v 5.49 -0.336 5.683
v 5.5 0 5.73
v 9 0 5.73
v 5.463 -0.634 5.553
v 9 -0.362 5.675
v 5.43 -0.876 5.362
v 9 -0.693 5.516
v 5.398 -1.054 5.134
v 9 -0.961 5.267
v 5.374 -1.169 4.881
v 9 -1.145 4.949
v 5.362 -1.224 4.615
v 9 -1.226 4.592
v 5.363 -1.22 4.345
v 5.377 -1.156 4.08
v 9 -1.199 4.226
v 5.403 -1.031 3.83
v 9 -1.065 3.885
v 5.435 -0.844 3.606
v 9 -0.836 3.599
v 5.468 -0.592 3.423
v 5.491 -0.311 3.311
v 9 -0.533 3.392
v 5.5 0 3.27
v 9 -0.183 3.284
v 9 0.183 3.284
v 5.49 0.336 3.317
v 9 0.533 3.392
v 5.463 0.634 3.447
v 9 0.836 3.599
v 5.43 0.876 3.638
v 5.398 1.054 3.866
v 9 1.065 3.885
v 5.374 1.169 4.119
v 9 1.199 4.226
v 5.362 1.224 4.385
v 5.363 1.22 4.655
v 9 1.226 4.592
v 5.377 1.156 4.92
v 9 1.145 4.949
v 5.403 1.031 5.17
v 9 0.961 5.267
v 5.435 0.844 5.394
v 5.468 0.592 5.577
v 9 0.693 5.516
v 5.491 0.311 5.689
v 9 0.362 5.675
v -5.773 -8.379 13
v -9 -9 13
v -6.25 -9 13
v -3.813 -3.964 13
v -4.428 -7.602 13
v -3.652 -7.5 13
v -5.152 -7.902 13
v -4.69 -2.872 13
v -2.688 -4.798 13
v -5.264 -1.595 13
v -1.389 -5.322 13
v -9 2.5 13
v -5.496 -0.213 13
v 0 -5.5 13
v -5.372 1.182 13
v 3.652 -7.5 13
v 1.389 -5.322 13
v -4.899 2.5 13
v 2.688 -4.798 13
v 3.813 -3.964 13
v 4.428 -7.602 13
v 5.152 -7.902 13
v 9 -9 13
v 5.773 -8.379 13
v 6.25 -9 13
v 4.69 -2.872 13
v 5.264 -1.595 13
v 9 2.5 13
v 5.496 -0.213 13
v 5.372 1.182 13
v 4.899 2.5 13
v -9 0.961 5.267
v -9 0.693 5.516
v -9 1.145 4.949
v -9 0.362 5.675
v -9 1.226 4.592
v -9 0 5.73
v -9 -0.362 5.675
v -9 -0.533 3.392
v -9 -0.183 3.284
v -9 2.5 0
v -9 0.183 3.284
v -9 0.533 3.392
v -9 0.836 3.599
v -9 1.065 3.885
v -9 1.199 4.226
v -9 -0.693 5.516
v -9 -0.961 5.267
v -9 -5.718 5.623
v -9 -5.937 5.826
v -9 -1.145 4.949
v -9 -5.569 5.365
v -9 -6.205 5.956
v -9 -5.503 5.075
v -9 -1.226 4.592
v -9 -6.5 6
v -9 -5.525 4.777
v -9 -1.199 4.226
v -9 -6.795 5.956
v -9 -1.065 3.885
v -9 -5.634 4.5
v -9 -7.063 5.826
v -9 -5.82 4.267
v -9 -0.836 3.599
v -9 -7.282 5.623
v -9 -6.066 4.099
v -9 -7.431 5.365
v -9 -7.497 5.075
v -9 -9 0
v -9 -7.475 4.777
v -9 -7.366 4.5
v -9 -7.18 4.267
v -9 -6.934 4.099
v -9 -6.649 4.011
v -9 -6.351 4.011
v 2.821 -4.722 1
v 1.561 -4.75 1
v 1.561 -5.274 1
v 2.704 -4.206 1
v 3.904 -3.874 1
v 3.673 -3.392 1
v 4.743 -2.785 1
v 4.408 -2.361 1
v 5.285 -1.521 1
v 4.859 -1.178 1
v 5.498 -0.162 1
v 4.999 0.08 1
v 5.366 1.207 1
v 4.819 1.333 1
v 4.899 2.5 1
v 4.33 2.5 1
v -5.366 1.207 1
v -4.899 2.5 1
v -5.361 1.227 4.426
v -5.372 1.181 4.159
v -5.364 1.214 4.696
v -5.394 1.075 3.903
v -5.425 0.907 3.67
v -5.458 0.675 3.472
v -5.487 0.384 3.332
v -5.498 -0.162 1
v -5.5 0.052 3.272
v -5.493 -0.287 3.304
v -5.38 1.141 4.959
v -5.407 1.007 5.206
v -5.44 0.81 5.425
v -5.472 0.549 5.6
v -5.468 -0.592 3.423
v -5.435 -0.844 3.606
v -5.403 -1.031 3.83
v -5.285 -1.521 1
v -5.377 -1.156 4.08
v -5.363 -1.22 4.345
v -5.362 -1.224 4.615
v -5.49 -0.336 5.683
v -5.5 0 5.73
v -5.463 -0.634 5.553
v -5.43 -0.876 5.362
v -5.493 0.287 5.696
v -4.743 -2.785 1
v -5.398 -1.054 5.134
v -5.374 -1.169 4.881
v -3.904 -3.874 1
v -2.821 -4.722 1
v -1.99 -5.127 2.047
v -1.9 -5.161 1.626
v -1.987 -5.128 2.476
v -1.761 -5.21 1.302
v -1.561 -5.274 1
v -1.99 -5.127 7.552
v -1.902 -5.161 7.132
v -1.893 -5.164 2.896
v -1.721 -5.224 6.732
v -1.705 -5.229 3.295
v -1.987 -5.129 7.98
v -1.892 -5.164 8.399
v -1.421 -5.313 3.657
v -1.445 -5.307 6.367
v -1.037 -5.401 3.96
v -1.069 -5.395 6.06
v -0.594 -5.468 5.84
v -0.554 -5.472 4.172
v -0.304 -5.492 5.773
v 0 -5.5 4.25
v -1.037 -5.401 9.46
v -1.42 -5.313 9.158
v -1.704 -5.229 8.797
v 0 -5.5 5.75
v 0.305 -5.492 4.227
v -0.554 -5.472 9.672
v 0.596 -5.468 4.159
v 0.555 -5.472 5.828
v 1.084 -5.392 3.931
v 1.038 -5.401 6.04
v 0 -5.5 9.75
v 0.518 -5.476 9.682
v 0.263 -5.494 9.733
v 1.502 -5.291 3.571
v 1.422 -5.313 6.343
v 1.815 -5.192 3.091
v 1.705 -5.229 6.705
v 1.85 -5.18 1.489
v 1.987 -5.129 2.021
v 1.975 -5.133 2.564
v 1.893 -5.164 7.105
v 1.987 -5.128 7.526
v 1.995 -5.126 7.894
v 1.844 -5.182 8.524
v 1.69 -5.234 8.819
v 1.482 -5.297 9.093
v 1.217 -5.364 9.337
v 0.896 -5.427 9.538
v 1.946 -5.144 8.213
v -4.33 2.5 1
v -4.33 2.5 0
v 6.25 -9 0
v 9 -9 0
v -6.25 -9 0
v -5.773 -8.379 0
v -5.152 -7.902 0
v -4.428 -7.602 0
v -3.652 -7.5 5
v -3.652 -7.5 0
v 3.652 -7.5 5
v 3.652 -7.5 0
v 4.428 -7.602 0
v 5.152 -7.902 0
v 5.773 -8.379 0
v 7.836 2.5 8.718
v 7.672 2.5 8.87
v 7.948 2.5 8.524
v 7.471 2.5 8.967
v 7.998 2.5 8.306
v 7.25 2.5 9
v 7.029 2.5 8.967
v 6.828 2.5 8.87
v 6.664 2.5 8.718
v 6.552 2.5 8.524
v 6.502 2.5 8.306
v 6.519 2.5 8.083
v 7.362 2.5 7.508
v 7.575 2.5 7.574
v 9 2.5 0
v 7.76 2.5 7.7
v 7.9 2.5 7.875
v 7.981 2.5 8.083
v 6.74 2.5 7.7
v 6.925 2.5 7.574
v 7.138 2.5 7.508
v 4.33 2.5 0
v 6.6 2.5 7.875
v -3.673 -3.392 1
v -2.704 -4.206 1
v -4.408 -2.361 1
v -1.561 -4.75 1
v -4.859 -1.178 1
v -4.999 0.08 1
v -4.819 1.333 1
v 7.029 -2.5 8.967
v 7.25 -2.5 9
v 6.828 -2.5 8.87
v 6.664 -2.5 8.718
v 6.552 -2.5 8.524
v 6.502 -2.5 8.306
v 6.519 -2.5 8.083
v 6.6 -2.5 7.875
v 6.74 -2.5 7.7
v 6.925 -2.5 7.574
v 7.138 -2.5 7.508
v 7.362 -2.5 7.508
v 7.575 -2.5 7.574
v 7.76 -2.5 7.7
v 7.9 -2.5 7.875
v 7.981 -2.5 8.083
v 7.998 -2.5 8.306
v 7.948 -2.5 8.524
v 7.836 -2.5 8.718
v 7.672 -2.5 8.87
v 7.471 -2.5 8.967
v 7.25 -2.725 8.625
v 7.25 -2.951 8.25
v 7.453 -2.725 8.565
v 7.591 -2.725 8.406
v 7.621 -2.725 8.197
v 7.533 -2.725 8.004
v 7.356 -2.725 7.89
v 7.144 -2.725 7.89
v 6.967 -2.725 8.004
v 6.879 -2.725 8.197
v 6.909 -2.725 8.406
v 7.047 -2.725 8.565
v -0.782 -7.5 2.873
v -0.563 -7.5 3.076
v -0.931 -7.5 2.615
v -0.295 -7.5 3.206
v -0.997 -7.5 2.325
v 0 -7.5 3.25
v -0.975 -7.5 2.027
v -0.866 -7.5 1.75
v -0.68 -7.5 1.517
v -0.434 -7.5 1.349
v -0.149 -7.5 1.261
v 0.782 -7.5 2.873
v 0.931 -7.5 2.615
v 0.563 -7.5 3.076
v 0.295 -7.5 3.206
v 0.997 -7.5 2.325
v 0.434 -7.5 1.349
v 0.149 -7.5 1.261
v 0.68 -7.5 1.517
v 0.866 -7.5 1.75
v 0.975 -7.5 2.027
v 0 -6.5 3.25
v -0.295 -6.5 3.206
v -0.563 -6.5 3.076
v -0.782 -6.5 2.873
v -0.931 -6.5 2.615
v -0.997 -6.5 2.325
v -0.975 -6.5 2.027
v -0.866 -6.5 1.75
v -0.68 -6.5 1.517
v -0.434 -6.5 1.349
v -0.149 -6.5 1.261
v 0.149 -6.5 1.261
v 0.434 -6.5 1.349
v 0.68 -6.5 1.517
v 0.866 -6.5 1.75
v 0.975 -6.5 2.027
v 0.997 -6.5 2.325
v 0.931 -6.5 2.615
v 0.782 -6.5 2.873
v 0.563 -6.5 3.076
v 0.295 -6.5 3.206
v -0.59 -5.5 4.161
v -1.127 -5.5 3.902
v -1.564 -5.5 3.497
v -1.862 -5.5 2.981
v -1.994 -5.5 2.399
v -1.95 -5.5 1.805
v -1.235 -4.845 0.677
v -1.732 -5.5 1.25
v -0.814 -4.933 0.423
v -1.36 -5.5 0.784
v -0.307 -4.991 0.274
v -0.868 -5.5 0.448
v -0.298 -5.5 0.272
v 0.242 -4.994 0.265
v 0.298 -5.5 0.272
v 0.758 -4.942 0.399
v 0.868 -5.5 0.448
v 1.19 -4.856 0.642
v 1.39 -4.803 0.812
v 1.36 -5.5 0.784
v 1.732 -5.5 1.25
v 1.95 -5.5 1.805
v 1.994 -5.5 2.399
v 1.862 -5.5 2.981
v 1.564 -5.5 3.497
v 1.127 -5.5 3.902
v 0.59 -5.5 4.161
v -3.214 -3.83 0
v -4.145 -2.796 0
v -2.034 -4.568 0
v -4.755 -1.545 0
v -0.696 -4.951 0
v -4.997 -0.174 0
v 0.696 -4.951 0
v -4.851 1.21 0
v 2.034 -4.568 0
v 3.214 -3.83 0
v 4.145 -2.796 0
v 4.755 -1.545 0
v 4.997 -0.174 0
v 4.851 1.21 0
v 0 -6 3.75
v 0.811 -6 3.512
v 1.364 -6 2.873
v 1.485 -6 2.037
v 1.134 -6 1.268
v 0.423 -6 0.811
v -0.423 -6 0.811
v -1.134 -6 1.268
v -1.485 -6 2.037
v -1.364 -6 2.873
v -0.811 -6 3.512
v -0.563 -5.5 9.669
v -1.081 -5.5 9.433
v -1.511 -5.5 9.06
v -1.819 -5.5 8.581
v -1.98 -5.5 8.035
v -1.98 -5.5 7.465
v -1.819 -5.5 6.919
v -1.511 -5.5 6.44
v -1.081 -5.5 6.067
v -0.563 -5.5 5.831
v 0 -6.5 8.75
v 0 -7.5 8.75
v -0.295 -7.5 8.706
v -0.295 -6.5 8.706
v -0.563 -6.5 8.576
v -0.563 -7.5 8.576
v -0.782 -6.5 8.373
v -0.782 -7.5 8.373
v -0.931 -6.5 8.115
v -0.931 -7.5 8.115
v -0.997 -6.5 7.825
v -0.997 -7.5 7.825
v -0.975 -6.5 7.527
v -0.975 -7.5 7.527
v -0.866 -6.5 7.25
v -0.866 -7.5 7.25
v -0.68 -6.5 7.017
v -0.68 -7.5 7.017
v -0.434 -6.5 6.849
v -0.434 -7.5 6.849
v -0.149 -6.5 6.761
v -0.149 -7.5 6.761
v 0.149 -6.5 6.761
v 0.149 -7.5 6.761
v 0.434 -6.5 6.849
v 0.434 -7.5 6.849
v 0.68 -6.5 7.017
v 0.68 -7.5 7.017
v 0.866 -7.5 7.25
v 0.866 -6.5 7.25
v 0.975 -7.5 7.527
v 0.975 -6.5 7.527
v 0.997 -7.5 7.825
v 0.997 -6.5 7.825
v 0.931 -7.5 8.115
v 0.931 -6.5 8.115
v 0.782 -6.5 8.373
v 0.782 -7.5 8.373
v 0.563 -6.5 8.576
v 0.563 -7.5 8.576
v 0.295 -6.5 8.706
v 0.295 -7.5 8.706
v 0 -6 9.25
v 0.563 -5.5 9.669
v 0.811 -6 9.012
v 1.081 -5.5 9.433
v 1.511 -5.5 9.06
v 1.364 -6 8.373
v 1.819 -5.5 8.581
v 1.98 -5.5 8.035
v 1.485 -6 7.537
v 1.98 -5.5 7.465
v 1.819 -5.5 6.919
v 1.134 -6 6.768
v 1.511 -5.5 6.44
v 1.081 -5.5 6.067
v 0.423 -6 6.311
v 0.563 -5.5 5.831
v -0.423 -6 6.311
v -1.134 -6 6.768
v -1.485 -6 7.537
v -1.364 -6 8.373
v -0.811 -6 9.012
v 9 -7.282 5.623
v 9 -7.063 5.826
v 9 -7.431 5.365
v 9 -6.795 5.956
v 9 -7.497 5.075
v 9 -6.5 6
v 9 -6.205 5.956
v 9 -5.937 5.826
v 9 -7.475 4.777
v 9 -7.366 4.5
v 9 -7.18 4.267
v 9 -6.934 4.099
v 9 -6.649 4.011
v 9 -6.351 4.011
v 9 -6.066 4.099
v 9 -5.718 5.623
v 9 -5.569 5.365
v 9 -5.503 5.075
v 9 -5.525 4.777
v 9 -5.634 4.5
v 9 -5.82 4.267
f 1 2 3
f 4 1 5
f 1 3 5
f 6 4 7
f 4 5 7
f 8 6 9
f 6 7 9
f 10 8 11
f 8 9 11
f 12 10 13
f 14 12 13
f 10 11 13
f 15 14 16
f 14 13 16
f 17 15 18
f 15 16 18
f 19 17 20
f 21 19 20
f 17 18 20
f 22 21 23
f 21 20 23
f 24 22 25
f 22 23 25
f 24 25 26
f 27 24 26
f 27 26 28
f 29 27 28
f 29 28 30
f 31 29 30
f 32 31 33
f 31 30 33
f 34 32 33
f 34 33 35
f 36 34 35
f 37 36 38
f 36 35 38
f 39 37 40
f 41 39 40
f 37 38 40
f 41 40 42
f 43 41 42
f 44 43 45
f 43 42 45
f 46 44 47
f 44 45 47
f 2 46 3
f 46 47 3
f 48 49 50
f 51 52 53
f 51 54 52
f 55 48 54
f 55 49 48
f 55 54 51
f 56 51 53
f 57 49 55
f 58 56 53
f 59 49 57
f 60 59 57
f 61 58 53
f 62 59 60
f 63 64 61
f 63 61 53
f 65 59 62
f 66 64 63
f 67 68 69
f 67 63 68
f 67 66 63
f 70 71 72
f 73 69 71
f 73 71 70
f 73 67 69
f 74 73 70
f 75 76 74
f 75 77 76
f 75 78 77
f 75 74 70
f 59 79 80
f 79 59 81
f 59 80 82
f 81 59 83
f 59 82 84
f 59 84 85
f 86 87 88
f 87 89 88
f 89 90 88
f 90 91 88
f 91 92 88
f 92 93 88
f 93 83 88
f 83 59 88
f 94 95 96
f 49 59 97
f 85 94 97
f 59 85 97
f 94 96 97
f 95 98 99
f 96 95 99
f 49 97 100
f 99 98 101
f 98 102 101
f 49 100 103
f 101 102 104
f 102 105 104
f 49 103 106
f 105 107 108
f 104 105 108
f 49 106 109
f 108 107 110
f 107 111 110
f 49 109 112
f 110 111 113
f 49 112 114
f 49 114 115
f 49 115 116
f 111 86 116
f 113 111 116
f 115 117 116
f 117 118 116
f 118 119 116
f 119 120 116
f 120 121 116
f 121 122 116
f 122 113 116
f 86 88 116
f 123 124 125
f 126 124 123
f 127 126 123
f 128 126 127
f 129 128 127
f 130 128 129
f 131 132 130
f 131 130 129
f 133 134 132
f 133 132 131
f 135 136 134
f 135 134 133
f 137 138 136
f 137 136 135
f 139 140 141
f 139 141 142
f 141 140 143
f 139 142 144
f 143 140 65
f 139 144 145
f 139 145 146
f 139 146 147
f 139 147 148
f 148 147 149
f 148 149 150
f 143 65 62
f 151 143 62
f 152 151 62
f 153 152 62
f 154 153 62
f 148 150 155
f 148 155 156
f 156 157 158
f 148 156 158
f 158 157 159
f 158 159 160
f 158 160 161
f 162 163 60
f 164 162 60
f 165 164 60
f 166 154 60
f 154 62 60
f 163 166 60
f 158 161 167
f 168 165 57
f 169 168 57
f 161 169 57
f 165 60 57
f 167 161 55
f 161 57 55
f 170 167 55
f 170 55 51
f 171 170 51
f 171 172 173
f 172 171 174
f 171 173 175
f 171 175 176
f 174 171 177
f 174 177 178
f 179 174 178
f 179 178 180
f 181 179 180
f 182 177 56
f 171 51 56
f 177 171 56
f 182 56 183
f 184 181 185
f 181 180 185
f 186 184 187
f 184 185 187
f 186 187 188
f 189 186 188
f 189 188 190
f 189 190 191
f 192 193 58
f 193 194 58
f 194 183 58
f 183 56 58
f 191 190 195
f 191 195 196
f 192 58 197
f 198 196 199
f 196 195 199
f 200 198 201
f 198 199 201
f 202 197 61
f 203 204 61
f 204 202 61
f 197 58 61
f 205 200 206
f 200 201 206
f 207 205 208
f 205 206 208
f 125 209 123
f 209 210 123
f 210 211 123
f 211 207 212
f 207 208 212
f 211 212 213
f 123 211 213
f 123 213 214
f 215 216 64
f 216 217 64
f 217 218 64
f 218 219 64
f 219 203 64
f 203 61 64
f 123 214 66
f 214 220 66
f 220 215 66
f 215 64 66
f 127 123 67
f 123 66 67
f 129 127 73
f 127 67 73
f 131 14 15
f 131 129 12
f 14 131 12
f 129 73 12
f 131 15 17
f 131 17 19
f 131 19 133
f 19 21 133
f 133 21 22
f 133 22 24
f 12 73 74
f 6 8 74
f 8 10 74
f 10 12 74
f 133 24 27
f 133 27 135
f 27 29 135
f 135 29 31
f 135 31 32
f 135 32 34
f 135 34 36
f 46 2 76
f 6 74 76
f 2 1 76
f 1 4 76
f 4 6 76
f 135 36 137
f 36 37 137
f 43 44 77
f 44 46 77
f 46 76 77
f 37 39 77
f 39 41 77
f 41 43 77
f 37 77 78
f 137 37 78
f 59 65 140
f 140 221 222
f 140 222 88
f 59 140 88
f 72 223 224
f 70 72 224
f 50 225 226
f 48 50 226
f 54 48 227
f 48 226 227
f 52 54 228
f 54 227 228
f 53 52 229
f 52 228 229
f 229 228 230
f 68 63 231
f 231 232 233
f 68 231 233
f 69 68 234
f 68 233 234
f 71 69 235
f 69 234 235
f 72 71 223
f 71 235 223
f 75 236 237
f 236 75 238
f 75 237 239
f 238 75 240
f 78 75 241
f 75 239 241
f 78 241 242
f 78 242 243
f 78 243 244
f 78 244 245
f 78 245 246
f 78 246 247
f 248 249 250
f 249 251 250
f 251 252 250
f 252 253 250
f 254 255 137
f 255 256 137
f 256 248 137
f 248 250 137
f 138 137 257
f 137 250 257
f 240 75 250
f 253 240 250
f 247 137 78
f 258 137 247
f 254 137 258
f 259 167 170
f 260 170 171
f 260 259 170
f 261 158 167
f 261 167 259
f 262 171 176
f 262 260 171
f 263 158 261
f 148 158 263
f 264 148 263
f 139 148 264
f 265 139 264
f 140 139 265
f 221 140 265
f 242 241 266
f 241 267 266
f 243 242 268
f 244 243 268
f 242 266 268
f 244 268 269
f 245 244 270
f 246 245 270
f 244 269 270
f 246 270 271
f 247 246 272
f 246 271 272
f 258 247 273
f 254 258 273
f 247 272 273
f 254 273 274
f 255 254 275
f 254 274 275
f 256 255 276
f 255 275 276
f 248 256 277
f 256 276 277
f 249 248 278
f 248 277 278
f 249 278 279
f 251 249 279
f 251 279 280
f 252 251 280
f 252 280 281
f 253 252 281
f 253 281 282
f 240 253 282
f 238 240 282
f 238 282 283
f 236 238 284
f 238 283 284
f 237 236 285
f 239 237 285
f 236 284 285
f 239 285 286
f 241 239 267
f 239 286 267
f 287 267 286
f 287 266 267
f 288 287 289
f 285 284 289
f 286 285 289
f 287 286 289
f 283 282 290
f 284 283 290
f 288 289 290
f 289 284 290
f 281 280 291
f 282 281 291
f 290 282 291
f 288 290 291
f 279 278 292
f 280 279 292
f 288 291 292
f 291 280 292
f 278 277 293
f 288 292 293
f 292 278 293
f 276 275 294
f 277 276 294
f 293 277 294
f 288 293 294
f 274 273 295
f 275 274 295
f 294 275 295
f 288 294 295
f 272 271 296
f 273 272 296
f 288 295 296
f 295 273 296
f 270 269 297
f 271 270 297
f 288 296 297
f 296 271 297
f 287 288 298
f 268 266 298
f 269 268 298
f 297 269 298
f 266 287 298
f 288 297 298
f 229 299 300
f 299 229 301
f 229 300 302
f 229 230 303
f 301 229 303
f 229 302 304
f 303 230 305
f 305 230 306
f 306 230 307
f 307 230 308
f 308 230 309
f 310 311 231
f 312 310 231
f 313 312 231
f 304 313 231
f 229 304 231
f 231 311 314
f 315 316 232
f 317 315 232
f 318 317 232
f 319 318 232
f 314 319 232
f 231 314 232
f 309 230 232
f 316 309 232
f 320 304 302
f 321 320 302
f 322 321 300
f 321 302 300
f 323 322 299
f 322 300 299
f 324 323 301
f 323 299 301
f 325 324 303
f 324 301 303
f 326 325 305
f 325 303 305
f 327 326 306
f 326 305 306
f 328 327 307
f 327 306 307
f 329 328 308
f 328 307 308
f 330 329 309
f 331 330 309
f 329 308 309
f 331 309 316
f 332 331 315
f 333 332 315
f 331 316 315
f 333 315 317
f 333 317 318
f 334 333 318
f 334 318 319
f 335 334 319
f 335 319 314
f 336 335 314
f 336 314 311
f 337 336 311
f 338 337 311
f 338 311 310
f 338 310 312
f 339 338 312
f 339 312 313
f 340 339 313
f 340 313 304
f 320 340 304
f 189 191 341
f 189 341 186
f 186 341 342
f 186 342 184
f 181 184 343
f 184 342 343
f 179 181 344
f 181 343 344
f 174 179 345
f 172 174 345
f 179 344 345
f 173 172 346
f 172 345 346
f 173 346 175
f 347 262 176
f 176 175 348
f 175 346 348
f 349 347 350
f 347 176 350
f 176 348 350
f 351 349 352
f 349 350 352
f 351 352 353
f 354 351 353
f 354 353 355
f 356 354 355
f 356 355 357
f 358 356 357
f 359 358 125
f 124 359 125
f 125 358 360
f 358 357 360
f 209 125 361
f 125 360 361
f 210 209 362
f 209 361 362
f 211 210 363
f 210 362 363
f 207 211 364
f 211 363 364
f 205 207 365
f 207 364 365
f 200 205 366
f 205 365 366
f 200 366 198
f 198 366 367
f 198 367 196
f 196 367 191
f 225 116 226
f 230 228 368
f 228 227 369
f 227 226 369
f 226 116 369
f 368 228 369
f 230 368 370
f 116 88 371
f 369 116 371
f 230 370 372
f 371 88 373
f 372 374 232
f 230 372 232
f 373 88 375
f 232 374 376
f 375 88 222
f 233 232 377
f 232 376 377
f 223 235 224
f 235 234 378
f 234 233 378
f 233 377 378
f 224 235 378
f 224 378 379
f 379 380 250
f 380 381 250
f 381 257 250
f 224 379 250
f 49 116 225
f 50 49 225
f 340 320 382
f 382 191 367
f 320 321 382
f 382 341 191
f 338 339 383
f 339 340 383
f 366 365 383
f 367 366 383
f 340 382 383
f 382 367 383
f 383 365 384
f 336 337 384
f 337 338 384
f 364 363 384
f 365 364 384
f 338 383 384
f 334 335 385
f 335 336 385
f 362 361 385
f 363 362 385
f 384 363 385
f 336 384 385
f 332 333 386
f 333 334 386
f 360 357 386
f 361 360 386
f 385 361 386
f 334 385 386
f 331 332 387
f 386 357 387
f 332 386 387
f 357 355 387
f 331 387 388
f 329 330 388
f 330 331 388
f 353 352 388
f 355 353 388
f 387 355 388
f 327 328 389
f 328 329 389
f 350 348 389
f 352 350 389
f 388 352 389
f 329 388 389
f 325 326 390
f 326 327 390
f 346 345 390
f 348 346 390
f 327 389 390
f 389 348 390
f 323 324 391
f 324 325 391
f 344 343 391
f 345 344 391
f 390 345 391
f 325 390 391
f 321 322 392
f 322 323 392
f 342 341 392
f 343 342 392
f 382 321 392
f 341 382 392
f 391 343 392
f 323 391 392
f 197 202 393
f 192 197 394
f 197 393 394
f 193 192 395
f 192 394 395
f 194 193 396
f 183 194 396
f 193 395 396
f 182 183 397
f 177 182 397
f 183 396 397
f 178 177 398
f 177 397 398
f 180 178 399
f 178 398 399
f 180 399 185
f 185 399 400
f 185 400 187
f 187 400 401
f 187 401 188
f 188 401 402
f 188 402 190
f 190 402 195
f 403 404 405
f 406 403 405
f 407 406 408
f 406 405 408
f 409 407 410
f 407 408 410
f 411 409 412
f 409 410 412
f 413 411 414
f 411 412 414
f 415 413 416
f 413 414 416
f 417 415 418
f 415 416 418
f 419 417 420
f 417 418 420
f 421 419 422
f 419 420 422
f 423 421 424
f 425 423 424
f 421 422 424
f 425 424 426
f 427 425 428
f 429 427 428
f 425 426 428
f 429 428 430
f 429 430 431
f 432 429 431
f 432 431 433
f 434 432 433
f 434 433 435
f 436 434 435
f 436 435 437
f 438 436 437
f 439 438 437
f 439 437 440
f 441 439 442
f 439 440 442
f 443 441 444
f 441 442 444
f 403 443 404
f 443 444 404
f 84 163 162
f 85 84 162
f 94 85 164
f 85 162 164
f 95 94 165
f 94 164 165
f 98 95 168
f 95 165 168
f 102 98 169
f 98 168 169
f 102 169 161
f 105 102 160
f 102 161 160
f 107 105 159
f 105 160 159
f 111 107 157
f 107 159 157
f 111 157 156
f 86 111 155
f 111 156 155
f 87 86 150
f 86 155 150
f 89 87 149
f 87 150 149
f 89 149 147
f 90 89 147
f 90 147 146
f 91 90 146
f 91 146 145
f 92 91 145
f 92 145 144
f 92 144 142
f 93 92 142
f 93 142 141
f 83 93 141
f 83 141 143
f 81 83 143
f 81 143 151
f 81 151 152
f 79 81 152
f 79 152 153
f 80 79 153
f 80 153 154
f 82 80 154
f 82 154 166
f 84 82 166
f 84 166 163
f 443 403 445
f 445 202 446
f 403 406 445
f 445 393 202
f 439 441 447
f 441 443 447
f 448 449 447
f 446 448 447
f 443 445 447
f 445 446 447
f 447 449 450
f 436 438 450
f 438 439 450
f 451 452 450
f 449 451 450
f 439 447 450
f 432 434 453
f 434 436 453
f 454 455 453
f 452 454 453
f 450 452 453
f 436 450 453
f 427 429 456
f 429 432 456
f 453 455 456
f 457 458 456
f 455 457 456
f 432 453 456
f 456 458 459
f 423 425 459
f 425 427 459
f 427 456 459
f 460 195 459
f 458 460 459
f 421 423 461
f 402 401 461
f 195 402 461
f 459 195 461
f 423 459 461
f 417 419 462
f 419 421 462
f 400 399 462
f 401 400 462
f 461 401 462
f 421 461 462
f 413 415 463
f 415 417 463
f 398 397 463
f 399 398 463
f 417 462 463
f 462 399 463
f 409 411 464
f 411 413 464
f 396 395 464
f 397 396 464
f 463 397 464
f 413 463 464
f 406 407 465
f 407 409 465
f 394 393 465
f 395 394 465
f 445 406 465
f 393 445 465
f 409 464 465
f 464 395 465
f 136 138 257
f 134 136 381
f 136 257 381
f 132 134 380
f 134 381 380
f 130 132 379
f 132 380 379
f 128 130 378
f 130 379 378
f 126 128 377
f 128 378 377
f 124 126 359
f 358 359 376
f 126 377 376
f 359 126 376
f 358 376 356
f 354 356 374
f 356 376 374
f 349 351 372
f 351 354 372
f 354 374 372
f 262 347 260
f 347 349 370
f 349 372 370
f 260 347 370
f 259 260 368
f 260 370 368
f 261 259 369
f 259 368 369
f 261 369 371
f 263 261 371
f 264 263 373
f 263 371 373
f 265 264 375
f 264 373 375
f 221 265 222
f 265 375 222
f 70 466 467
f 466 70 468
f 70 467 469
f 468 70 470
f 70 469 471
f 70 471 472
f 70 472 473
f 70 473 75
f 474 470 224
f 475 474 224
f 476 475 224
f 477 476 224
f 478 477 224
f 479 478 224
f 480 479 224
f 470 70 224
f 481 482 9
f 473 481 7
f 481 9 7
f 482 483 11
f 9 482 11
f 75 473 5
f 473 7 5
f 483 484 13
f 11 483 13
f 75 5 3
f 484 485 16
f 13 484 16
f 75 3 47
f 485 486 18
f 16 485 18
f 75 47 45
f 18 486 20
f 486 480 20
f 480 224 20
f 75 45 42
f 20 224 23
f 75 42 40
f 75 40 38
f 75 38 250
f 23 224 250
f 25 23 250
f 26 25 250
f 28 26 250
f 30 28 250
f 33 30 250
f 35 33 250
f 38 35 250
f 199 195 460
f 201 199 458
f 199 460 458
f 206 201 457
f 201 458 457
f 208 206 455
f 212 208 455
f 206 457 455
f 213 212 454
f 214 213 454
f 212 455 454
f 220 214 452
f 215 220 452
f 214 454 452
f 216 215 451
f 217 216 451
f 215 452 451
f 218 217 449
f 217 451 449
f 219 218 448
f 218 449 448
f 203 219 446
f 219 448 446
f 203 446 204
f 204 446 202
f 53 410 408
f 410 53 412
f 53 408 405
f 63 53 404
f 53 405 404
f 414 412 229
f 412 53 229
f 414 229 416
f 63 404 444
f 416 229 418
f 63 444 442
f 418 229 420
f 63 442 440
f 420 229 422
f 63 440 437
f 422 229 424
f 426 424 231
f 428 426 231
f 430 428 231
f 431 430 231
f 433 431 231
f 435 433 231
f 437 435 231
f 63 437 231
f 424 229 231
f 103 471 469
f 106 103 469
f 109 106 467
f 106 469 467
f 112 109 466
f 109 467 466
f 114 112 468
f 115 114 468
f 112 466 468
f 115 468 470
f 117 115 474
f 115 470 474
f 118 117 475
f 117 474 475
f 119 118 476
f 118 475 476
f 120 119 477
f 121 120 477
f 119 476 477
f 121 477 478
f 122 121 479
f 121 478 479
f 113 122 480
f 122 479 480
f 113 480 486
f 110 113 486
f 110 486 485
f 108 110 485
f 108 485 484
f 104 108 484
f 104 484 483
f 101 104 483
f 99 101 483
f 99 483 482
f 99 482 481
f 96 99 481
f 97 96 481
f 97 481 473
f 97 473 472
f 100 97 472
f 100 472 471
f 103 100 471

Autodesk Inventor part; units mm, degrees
ref_plane "YZ Plane" through (0, 0, 0) normal (1, 0, 0) x (0, 1, 0)
ref_plane "XZ Plane" through (0, 0, 0) normal (0, 1, 0) x (-1, 0, 0)
sketch "Sketch1" plane through (0, 0, 0) normal (0, 0, 1) x (1, 0, 0)
  arc A0 (-4.3301, 2.5) -> (4.3301, 2.5) centre (0, 0) ccw
  line L0 (-4.3301, 2.5) -> (-9, 2.5)
  line L1 (-9, 2.5) -> (-9, -9)
  line L2 (-9, -9) -> (-6.25, -9)
  line L3 (-3.6519, -7.5) -> (3.6519, -7.5)
  line L4 (6.25, -9) -> (9, -9)
  line L5 (9, -9) -> (9, 2.5)
  line L6 (9, 2.5) -> (4.3301, 2.5)
  line L7 (0, 15.116) -> (0, -11.4442) construction
  arc A1 (-3.6519, -7.5) -> (-6.25, -9) centre (-3.6519, -10.5) ccw
  arc A2 (6.25, -9) -> (3.6519, -7.5) centre (3.6519, -10.5) ccw
  dimension "d0" = 10
  dimension "d2" = 7.5
  dimension "d5" = 18
  dimension "d6" = 2.5
  dimension "d7" = 6
  dimension "d8" = 6
  dimension "d9" = 12.5
  dimension "d10" = 1.5
sketch "Sketch2" plane through (0, 0, 0) normal (0, 0, 1) x (1, 0, 0)
  line L0 (-4.3301, 2.5) -> (-9, 2.5) projected
  line L1 (-9, 2.5) -> (-9, -9) projected
  line L2 (-9, -9) -> (-6.25, -9) projected
  arc A0 (-3.6519, -7.5) -> (-6.25, -9) centre (-3.6519, -10.5) ccw projected
  line L3 (-3.6519, -7.5) -> (3.6519, -7.5) projected
  arc A1 (6.25, -9) -> (3.6519, -7.5) centre (3.6519, -10.5) ccw projected
  line L4 (6.25, -9) -> (9, -9) projected
  line L5 (9, -9) -> (9, 2.5) projected
  line L6 (9, 2.5) -> (4.3301, 2.5) projected
  arc A2 (-4.3301, 2.5) -> (4.3301, 2.5) centre (0, 0) ccw projected
extrude "Extrusion1" add sketch "Sketch2" along normal blind 13
sketch "Sketch3" plane through (0, 0, 13) normal (0, 0, 1) x (1, 0, 0)
  circle A0 centre (0, 0) radius 5.5
  dimension "d13" = 11
extrude "Extrusion2" cut sketch "Sketch3" against normal blind 12
sketch "Sketch4" plane through (-9, 2.5, 0) normal (0, 1, 0) x (1, 0, 0)
  line L0 (9, 0) -> (9, -15.5) construction
  line L1 (18, -13) -> (13.899, -13) projected
  line L2 (14.5, -13) -> (3.5, -13) projected
  point P0 (9, -2.25)
  point P1 (9, -7.75)
  point P2 (16.25, -8.25)
  point P3 (4.101, -13)
  dimension "d16" = 7.25
  dimension "d17" = 4.75
  dimension "d18" = 5.25
  dimension "d19" = 5.5
sketch "Sketch5" plane through (4.3301, 2.5, 0) normal (0, 1, 0) x (1, 0, 0)
  point P0 (-4.3301, 0)
  point P1 (2.9199, -8.25)
hole "Hole1" at (7.25, 2.5, 8.25) direction (0, -1, 0) diameter 1.5 depth 5 tip angle 118
ref_plane "Work Plane1" through (0, -5.5, 13) normal (0, 1, 0) x (-1, 0, 0)
sketch "Sketch6" plane through (-9, 2.5, 0) normal (0, 1, 0) x (1, 0, 0)
  point P0 (9, 0)
  point P1 (9, -2.25)
  point P2 (9, -7.75)
hole "Hole2" at (0, 2.5, 7.75) at (0, 2.5, 2.25) direction (0, -1, 0) diameter 4 depth 8
sketch "Sketch7" plane through (0, -5.5, 13) normal (0, 1, 0) x (-1, 0, 0)
  point P0 (0, -13)
  point P1 (0, -10.75)
  point P2 (0, -5.25)
hole "Hole3" at (0, -5.5, 2.25) at (0, -5.5, 7.75) direction (0, -1, 0) diameter 2 end through all countersink diameter 4 countersink angle 90
sketch "Sketch8" plane through (-9, -9, 0) normal (-1, 0, 0) x (0, 0, 1)
  line L0 (0, 11.5) -> (13, 11.5) projected
  line L1 (0, 11.5) -> (0, 0) projected
  point P0 (0, 9)
  point P1 (5, 2.5)
  point P2 (4.5, 9)
  dimension "d41" = 9
  dimension "d42" = 5
  dimension "d43" = 2.5
  dimension "d44" = 4.5
sketch "Sketch9" plane through (-9, -9, 0) normal (-1, 0, 0) x (0, 0, 1)
  point P0 (0, 9)
  point P1 (5, 2.5)
hole "Hole4" at (-9, -6.5, 5) direction (1, 0, 0) diameter 2 end through all
sketch "Sketch10" plane through (-9, -9, 0) normal (-1, 0, 0) x (0, 0, 1)
  point P0 (0, 9)
  point P1 (4.5, 9)
hole "Hole5" at (-9, 0, 4.5) direction (1, 0, 0) diameter 2.459 end through all thread size "M3x0.5" class "6H" standard "ANSI Metric M Profile"
equation "\"d7\" = d8"
properties part number "trolley"
